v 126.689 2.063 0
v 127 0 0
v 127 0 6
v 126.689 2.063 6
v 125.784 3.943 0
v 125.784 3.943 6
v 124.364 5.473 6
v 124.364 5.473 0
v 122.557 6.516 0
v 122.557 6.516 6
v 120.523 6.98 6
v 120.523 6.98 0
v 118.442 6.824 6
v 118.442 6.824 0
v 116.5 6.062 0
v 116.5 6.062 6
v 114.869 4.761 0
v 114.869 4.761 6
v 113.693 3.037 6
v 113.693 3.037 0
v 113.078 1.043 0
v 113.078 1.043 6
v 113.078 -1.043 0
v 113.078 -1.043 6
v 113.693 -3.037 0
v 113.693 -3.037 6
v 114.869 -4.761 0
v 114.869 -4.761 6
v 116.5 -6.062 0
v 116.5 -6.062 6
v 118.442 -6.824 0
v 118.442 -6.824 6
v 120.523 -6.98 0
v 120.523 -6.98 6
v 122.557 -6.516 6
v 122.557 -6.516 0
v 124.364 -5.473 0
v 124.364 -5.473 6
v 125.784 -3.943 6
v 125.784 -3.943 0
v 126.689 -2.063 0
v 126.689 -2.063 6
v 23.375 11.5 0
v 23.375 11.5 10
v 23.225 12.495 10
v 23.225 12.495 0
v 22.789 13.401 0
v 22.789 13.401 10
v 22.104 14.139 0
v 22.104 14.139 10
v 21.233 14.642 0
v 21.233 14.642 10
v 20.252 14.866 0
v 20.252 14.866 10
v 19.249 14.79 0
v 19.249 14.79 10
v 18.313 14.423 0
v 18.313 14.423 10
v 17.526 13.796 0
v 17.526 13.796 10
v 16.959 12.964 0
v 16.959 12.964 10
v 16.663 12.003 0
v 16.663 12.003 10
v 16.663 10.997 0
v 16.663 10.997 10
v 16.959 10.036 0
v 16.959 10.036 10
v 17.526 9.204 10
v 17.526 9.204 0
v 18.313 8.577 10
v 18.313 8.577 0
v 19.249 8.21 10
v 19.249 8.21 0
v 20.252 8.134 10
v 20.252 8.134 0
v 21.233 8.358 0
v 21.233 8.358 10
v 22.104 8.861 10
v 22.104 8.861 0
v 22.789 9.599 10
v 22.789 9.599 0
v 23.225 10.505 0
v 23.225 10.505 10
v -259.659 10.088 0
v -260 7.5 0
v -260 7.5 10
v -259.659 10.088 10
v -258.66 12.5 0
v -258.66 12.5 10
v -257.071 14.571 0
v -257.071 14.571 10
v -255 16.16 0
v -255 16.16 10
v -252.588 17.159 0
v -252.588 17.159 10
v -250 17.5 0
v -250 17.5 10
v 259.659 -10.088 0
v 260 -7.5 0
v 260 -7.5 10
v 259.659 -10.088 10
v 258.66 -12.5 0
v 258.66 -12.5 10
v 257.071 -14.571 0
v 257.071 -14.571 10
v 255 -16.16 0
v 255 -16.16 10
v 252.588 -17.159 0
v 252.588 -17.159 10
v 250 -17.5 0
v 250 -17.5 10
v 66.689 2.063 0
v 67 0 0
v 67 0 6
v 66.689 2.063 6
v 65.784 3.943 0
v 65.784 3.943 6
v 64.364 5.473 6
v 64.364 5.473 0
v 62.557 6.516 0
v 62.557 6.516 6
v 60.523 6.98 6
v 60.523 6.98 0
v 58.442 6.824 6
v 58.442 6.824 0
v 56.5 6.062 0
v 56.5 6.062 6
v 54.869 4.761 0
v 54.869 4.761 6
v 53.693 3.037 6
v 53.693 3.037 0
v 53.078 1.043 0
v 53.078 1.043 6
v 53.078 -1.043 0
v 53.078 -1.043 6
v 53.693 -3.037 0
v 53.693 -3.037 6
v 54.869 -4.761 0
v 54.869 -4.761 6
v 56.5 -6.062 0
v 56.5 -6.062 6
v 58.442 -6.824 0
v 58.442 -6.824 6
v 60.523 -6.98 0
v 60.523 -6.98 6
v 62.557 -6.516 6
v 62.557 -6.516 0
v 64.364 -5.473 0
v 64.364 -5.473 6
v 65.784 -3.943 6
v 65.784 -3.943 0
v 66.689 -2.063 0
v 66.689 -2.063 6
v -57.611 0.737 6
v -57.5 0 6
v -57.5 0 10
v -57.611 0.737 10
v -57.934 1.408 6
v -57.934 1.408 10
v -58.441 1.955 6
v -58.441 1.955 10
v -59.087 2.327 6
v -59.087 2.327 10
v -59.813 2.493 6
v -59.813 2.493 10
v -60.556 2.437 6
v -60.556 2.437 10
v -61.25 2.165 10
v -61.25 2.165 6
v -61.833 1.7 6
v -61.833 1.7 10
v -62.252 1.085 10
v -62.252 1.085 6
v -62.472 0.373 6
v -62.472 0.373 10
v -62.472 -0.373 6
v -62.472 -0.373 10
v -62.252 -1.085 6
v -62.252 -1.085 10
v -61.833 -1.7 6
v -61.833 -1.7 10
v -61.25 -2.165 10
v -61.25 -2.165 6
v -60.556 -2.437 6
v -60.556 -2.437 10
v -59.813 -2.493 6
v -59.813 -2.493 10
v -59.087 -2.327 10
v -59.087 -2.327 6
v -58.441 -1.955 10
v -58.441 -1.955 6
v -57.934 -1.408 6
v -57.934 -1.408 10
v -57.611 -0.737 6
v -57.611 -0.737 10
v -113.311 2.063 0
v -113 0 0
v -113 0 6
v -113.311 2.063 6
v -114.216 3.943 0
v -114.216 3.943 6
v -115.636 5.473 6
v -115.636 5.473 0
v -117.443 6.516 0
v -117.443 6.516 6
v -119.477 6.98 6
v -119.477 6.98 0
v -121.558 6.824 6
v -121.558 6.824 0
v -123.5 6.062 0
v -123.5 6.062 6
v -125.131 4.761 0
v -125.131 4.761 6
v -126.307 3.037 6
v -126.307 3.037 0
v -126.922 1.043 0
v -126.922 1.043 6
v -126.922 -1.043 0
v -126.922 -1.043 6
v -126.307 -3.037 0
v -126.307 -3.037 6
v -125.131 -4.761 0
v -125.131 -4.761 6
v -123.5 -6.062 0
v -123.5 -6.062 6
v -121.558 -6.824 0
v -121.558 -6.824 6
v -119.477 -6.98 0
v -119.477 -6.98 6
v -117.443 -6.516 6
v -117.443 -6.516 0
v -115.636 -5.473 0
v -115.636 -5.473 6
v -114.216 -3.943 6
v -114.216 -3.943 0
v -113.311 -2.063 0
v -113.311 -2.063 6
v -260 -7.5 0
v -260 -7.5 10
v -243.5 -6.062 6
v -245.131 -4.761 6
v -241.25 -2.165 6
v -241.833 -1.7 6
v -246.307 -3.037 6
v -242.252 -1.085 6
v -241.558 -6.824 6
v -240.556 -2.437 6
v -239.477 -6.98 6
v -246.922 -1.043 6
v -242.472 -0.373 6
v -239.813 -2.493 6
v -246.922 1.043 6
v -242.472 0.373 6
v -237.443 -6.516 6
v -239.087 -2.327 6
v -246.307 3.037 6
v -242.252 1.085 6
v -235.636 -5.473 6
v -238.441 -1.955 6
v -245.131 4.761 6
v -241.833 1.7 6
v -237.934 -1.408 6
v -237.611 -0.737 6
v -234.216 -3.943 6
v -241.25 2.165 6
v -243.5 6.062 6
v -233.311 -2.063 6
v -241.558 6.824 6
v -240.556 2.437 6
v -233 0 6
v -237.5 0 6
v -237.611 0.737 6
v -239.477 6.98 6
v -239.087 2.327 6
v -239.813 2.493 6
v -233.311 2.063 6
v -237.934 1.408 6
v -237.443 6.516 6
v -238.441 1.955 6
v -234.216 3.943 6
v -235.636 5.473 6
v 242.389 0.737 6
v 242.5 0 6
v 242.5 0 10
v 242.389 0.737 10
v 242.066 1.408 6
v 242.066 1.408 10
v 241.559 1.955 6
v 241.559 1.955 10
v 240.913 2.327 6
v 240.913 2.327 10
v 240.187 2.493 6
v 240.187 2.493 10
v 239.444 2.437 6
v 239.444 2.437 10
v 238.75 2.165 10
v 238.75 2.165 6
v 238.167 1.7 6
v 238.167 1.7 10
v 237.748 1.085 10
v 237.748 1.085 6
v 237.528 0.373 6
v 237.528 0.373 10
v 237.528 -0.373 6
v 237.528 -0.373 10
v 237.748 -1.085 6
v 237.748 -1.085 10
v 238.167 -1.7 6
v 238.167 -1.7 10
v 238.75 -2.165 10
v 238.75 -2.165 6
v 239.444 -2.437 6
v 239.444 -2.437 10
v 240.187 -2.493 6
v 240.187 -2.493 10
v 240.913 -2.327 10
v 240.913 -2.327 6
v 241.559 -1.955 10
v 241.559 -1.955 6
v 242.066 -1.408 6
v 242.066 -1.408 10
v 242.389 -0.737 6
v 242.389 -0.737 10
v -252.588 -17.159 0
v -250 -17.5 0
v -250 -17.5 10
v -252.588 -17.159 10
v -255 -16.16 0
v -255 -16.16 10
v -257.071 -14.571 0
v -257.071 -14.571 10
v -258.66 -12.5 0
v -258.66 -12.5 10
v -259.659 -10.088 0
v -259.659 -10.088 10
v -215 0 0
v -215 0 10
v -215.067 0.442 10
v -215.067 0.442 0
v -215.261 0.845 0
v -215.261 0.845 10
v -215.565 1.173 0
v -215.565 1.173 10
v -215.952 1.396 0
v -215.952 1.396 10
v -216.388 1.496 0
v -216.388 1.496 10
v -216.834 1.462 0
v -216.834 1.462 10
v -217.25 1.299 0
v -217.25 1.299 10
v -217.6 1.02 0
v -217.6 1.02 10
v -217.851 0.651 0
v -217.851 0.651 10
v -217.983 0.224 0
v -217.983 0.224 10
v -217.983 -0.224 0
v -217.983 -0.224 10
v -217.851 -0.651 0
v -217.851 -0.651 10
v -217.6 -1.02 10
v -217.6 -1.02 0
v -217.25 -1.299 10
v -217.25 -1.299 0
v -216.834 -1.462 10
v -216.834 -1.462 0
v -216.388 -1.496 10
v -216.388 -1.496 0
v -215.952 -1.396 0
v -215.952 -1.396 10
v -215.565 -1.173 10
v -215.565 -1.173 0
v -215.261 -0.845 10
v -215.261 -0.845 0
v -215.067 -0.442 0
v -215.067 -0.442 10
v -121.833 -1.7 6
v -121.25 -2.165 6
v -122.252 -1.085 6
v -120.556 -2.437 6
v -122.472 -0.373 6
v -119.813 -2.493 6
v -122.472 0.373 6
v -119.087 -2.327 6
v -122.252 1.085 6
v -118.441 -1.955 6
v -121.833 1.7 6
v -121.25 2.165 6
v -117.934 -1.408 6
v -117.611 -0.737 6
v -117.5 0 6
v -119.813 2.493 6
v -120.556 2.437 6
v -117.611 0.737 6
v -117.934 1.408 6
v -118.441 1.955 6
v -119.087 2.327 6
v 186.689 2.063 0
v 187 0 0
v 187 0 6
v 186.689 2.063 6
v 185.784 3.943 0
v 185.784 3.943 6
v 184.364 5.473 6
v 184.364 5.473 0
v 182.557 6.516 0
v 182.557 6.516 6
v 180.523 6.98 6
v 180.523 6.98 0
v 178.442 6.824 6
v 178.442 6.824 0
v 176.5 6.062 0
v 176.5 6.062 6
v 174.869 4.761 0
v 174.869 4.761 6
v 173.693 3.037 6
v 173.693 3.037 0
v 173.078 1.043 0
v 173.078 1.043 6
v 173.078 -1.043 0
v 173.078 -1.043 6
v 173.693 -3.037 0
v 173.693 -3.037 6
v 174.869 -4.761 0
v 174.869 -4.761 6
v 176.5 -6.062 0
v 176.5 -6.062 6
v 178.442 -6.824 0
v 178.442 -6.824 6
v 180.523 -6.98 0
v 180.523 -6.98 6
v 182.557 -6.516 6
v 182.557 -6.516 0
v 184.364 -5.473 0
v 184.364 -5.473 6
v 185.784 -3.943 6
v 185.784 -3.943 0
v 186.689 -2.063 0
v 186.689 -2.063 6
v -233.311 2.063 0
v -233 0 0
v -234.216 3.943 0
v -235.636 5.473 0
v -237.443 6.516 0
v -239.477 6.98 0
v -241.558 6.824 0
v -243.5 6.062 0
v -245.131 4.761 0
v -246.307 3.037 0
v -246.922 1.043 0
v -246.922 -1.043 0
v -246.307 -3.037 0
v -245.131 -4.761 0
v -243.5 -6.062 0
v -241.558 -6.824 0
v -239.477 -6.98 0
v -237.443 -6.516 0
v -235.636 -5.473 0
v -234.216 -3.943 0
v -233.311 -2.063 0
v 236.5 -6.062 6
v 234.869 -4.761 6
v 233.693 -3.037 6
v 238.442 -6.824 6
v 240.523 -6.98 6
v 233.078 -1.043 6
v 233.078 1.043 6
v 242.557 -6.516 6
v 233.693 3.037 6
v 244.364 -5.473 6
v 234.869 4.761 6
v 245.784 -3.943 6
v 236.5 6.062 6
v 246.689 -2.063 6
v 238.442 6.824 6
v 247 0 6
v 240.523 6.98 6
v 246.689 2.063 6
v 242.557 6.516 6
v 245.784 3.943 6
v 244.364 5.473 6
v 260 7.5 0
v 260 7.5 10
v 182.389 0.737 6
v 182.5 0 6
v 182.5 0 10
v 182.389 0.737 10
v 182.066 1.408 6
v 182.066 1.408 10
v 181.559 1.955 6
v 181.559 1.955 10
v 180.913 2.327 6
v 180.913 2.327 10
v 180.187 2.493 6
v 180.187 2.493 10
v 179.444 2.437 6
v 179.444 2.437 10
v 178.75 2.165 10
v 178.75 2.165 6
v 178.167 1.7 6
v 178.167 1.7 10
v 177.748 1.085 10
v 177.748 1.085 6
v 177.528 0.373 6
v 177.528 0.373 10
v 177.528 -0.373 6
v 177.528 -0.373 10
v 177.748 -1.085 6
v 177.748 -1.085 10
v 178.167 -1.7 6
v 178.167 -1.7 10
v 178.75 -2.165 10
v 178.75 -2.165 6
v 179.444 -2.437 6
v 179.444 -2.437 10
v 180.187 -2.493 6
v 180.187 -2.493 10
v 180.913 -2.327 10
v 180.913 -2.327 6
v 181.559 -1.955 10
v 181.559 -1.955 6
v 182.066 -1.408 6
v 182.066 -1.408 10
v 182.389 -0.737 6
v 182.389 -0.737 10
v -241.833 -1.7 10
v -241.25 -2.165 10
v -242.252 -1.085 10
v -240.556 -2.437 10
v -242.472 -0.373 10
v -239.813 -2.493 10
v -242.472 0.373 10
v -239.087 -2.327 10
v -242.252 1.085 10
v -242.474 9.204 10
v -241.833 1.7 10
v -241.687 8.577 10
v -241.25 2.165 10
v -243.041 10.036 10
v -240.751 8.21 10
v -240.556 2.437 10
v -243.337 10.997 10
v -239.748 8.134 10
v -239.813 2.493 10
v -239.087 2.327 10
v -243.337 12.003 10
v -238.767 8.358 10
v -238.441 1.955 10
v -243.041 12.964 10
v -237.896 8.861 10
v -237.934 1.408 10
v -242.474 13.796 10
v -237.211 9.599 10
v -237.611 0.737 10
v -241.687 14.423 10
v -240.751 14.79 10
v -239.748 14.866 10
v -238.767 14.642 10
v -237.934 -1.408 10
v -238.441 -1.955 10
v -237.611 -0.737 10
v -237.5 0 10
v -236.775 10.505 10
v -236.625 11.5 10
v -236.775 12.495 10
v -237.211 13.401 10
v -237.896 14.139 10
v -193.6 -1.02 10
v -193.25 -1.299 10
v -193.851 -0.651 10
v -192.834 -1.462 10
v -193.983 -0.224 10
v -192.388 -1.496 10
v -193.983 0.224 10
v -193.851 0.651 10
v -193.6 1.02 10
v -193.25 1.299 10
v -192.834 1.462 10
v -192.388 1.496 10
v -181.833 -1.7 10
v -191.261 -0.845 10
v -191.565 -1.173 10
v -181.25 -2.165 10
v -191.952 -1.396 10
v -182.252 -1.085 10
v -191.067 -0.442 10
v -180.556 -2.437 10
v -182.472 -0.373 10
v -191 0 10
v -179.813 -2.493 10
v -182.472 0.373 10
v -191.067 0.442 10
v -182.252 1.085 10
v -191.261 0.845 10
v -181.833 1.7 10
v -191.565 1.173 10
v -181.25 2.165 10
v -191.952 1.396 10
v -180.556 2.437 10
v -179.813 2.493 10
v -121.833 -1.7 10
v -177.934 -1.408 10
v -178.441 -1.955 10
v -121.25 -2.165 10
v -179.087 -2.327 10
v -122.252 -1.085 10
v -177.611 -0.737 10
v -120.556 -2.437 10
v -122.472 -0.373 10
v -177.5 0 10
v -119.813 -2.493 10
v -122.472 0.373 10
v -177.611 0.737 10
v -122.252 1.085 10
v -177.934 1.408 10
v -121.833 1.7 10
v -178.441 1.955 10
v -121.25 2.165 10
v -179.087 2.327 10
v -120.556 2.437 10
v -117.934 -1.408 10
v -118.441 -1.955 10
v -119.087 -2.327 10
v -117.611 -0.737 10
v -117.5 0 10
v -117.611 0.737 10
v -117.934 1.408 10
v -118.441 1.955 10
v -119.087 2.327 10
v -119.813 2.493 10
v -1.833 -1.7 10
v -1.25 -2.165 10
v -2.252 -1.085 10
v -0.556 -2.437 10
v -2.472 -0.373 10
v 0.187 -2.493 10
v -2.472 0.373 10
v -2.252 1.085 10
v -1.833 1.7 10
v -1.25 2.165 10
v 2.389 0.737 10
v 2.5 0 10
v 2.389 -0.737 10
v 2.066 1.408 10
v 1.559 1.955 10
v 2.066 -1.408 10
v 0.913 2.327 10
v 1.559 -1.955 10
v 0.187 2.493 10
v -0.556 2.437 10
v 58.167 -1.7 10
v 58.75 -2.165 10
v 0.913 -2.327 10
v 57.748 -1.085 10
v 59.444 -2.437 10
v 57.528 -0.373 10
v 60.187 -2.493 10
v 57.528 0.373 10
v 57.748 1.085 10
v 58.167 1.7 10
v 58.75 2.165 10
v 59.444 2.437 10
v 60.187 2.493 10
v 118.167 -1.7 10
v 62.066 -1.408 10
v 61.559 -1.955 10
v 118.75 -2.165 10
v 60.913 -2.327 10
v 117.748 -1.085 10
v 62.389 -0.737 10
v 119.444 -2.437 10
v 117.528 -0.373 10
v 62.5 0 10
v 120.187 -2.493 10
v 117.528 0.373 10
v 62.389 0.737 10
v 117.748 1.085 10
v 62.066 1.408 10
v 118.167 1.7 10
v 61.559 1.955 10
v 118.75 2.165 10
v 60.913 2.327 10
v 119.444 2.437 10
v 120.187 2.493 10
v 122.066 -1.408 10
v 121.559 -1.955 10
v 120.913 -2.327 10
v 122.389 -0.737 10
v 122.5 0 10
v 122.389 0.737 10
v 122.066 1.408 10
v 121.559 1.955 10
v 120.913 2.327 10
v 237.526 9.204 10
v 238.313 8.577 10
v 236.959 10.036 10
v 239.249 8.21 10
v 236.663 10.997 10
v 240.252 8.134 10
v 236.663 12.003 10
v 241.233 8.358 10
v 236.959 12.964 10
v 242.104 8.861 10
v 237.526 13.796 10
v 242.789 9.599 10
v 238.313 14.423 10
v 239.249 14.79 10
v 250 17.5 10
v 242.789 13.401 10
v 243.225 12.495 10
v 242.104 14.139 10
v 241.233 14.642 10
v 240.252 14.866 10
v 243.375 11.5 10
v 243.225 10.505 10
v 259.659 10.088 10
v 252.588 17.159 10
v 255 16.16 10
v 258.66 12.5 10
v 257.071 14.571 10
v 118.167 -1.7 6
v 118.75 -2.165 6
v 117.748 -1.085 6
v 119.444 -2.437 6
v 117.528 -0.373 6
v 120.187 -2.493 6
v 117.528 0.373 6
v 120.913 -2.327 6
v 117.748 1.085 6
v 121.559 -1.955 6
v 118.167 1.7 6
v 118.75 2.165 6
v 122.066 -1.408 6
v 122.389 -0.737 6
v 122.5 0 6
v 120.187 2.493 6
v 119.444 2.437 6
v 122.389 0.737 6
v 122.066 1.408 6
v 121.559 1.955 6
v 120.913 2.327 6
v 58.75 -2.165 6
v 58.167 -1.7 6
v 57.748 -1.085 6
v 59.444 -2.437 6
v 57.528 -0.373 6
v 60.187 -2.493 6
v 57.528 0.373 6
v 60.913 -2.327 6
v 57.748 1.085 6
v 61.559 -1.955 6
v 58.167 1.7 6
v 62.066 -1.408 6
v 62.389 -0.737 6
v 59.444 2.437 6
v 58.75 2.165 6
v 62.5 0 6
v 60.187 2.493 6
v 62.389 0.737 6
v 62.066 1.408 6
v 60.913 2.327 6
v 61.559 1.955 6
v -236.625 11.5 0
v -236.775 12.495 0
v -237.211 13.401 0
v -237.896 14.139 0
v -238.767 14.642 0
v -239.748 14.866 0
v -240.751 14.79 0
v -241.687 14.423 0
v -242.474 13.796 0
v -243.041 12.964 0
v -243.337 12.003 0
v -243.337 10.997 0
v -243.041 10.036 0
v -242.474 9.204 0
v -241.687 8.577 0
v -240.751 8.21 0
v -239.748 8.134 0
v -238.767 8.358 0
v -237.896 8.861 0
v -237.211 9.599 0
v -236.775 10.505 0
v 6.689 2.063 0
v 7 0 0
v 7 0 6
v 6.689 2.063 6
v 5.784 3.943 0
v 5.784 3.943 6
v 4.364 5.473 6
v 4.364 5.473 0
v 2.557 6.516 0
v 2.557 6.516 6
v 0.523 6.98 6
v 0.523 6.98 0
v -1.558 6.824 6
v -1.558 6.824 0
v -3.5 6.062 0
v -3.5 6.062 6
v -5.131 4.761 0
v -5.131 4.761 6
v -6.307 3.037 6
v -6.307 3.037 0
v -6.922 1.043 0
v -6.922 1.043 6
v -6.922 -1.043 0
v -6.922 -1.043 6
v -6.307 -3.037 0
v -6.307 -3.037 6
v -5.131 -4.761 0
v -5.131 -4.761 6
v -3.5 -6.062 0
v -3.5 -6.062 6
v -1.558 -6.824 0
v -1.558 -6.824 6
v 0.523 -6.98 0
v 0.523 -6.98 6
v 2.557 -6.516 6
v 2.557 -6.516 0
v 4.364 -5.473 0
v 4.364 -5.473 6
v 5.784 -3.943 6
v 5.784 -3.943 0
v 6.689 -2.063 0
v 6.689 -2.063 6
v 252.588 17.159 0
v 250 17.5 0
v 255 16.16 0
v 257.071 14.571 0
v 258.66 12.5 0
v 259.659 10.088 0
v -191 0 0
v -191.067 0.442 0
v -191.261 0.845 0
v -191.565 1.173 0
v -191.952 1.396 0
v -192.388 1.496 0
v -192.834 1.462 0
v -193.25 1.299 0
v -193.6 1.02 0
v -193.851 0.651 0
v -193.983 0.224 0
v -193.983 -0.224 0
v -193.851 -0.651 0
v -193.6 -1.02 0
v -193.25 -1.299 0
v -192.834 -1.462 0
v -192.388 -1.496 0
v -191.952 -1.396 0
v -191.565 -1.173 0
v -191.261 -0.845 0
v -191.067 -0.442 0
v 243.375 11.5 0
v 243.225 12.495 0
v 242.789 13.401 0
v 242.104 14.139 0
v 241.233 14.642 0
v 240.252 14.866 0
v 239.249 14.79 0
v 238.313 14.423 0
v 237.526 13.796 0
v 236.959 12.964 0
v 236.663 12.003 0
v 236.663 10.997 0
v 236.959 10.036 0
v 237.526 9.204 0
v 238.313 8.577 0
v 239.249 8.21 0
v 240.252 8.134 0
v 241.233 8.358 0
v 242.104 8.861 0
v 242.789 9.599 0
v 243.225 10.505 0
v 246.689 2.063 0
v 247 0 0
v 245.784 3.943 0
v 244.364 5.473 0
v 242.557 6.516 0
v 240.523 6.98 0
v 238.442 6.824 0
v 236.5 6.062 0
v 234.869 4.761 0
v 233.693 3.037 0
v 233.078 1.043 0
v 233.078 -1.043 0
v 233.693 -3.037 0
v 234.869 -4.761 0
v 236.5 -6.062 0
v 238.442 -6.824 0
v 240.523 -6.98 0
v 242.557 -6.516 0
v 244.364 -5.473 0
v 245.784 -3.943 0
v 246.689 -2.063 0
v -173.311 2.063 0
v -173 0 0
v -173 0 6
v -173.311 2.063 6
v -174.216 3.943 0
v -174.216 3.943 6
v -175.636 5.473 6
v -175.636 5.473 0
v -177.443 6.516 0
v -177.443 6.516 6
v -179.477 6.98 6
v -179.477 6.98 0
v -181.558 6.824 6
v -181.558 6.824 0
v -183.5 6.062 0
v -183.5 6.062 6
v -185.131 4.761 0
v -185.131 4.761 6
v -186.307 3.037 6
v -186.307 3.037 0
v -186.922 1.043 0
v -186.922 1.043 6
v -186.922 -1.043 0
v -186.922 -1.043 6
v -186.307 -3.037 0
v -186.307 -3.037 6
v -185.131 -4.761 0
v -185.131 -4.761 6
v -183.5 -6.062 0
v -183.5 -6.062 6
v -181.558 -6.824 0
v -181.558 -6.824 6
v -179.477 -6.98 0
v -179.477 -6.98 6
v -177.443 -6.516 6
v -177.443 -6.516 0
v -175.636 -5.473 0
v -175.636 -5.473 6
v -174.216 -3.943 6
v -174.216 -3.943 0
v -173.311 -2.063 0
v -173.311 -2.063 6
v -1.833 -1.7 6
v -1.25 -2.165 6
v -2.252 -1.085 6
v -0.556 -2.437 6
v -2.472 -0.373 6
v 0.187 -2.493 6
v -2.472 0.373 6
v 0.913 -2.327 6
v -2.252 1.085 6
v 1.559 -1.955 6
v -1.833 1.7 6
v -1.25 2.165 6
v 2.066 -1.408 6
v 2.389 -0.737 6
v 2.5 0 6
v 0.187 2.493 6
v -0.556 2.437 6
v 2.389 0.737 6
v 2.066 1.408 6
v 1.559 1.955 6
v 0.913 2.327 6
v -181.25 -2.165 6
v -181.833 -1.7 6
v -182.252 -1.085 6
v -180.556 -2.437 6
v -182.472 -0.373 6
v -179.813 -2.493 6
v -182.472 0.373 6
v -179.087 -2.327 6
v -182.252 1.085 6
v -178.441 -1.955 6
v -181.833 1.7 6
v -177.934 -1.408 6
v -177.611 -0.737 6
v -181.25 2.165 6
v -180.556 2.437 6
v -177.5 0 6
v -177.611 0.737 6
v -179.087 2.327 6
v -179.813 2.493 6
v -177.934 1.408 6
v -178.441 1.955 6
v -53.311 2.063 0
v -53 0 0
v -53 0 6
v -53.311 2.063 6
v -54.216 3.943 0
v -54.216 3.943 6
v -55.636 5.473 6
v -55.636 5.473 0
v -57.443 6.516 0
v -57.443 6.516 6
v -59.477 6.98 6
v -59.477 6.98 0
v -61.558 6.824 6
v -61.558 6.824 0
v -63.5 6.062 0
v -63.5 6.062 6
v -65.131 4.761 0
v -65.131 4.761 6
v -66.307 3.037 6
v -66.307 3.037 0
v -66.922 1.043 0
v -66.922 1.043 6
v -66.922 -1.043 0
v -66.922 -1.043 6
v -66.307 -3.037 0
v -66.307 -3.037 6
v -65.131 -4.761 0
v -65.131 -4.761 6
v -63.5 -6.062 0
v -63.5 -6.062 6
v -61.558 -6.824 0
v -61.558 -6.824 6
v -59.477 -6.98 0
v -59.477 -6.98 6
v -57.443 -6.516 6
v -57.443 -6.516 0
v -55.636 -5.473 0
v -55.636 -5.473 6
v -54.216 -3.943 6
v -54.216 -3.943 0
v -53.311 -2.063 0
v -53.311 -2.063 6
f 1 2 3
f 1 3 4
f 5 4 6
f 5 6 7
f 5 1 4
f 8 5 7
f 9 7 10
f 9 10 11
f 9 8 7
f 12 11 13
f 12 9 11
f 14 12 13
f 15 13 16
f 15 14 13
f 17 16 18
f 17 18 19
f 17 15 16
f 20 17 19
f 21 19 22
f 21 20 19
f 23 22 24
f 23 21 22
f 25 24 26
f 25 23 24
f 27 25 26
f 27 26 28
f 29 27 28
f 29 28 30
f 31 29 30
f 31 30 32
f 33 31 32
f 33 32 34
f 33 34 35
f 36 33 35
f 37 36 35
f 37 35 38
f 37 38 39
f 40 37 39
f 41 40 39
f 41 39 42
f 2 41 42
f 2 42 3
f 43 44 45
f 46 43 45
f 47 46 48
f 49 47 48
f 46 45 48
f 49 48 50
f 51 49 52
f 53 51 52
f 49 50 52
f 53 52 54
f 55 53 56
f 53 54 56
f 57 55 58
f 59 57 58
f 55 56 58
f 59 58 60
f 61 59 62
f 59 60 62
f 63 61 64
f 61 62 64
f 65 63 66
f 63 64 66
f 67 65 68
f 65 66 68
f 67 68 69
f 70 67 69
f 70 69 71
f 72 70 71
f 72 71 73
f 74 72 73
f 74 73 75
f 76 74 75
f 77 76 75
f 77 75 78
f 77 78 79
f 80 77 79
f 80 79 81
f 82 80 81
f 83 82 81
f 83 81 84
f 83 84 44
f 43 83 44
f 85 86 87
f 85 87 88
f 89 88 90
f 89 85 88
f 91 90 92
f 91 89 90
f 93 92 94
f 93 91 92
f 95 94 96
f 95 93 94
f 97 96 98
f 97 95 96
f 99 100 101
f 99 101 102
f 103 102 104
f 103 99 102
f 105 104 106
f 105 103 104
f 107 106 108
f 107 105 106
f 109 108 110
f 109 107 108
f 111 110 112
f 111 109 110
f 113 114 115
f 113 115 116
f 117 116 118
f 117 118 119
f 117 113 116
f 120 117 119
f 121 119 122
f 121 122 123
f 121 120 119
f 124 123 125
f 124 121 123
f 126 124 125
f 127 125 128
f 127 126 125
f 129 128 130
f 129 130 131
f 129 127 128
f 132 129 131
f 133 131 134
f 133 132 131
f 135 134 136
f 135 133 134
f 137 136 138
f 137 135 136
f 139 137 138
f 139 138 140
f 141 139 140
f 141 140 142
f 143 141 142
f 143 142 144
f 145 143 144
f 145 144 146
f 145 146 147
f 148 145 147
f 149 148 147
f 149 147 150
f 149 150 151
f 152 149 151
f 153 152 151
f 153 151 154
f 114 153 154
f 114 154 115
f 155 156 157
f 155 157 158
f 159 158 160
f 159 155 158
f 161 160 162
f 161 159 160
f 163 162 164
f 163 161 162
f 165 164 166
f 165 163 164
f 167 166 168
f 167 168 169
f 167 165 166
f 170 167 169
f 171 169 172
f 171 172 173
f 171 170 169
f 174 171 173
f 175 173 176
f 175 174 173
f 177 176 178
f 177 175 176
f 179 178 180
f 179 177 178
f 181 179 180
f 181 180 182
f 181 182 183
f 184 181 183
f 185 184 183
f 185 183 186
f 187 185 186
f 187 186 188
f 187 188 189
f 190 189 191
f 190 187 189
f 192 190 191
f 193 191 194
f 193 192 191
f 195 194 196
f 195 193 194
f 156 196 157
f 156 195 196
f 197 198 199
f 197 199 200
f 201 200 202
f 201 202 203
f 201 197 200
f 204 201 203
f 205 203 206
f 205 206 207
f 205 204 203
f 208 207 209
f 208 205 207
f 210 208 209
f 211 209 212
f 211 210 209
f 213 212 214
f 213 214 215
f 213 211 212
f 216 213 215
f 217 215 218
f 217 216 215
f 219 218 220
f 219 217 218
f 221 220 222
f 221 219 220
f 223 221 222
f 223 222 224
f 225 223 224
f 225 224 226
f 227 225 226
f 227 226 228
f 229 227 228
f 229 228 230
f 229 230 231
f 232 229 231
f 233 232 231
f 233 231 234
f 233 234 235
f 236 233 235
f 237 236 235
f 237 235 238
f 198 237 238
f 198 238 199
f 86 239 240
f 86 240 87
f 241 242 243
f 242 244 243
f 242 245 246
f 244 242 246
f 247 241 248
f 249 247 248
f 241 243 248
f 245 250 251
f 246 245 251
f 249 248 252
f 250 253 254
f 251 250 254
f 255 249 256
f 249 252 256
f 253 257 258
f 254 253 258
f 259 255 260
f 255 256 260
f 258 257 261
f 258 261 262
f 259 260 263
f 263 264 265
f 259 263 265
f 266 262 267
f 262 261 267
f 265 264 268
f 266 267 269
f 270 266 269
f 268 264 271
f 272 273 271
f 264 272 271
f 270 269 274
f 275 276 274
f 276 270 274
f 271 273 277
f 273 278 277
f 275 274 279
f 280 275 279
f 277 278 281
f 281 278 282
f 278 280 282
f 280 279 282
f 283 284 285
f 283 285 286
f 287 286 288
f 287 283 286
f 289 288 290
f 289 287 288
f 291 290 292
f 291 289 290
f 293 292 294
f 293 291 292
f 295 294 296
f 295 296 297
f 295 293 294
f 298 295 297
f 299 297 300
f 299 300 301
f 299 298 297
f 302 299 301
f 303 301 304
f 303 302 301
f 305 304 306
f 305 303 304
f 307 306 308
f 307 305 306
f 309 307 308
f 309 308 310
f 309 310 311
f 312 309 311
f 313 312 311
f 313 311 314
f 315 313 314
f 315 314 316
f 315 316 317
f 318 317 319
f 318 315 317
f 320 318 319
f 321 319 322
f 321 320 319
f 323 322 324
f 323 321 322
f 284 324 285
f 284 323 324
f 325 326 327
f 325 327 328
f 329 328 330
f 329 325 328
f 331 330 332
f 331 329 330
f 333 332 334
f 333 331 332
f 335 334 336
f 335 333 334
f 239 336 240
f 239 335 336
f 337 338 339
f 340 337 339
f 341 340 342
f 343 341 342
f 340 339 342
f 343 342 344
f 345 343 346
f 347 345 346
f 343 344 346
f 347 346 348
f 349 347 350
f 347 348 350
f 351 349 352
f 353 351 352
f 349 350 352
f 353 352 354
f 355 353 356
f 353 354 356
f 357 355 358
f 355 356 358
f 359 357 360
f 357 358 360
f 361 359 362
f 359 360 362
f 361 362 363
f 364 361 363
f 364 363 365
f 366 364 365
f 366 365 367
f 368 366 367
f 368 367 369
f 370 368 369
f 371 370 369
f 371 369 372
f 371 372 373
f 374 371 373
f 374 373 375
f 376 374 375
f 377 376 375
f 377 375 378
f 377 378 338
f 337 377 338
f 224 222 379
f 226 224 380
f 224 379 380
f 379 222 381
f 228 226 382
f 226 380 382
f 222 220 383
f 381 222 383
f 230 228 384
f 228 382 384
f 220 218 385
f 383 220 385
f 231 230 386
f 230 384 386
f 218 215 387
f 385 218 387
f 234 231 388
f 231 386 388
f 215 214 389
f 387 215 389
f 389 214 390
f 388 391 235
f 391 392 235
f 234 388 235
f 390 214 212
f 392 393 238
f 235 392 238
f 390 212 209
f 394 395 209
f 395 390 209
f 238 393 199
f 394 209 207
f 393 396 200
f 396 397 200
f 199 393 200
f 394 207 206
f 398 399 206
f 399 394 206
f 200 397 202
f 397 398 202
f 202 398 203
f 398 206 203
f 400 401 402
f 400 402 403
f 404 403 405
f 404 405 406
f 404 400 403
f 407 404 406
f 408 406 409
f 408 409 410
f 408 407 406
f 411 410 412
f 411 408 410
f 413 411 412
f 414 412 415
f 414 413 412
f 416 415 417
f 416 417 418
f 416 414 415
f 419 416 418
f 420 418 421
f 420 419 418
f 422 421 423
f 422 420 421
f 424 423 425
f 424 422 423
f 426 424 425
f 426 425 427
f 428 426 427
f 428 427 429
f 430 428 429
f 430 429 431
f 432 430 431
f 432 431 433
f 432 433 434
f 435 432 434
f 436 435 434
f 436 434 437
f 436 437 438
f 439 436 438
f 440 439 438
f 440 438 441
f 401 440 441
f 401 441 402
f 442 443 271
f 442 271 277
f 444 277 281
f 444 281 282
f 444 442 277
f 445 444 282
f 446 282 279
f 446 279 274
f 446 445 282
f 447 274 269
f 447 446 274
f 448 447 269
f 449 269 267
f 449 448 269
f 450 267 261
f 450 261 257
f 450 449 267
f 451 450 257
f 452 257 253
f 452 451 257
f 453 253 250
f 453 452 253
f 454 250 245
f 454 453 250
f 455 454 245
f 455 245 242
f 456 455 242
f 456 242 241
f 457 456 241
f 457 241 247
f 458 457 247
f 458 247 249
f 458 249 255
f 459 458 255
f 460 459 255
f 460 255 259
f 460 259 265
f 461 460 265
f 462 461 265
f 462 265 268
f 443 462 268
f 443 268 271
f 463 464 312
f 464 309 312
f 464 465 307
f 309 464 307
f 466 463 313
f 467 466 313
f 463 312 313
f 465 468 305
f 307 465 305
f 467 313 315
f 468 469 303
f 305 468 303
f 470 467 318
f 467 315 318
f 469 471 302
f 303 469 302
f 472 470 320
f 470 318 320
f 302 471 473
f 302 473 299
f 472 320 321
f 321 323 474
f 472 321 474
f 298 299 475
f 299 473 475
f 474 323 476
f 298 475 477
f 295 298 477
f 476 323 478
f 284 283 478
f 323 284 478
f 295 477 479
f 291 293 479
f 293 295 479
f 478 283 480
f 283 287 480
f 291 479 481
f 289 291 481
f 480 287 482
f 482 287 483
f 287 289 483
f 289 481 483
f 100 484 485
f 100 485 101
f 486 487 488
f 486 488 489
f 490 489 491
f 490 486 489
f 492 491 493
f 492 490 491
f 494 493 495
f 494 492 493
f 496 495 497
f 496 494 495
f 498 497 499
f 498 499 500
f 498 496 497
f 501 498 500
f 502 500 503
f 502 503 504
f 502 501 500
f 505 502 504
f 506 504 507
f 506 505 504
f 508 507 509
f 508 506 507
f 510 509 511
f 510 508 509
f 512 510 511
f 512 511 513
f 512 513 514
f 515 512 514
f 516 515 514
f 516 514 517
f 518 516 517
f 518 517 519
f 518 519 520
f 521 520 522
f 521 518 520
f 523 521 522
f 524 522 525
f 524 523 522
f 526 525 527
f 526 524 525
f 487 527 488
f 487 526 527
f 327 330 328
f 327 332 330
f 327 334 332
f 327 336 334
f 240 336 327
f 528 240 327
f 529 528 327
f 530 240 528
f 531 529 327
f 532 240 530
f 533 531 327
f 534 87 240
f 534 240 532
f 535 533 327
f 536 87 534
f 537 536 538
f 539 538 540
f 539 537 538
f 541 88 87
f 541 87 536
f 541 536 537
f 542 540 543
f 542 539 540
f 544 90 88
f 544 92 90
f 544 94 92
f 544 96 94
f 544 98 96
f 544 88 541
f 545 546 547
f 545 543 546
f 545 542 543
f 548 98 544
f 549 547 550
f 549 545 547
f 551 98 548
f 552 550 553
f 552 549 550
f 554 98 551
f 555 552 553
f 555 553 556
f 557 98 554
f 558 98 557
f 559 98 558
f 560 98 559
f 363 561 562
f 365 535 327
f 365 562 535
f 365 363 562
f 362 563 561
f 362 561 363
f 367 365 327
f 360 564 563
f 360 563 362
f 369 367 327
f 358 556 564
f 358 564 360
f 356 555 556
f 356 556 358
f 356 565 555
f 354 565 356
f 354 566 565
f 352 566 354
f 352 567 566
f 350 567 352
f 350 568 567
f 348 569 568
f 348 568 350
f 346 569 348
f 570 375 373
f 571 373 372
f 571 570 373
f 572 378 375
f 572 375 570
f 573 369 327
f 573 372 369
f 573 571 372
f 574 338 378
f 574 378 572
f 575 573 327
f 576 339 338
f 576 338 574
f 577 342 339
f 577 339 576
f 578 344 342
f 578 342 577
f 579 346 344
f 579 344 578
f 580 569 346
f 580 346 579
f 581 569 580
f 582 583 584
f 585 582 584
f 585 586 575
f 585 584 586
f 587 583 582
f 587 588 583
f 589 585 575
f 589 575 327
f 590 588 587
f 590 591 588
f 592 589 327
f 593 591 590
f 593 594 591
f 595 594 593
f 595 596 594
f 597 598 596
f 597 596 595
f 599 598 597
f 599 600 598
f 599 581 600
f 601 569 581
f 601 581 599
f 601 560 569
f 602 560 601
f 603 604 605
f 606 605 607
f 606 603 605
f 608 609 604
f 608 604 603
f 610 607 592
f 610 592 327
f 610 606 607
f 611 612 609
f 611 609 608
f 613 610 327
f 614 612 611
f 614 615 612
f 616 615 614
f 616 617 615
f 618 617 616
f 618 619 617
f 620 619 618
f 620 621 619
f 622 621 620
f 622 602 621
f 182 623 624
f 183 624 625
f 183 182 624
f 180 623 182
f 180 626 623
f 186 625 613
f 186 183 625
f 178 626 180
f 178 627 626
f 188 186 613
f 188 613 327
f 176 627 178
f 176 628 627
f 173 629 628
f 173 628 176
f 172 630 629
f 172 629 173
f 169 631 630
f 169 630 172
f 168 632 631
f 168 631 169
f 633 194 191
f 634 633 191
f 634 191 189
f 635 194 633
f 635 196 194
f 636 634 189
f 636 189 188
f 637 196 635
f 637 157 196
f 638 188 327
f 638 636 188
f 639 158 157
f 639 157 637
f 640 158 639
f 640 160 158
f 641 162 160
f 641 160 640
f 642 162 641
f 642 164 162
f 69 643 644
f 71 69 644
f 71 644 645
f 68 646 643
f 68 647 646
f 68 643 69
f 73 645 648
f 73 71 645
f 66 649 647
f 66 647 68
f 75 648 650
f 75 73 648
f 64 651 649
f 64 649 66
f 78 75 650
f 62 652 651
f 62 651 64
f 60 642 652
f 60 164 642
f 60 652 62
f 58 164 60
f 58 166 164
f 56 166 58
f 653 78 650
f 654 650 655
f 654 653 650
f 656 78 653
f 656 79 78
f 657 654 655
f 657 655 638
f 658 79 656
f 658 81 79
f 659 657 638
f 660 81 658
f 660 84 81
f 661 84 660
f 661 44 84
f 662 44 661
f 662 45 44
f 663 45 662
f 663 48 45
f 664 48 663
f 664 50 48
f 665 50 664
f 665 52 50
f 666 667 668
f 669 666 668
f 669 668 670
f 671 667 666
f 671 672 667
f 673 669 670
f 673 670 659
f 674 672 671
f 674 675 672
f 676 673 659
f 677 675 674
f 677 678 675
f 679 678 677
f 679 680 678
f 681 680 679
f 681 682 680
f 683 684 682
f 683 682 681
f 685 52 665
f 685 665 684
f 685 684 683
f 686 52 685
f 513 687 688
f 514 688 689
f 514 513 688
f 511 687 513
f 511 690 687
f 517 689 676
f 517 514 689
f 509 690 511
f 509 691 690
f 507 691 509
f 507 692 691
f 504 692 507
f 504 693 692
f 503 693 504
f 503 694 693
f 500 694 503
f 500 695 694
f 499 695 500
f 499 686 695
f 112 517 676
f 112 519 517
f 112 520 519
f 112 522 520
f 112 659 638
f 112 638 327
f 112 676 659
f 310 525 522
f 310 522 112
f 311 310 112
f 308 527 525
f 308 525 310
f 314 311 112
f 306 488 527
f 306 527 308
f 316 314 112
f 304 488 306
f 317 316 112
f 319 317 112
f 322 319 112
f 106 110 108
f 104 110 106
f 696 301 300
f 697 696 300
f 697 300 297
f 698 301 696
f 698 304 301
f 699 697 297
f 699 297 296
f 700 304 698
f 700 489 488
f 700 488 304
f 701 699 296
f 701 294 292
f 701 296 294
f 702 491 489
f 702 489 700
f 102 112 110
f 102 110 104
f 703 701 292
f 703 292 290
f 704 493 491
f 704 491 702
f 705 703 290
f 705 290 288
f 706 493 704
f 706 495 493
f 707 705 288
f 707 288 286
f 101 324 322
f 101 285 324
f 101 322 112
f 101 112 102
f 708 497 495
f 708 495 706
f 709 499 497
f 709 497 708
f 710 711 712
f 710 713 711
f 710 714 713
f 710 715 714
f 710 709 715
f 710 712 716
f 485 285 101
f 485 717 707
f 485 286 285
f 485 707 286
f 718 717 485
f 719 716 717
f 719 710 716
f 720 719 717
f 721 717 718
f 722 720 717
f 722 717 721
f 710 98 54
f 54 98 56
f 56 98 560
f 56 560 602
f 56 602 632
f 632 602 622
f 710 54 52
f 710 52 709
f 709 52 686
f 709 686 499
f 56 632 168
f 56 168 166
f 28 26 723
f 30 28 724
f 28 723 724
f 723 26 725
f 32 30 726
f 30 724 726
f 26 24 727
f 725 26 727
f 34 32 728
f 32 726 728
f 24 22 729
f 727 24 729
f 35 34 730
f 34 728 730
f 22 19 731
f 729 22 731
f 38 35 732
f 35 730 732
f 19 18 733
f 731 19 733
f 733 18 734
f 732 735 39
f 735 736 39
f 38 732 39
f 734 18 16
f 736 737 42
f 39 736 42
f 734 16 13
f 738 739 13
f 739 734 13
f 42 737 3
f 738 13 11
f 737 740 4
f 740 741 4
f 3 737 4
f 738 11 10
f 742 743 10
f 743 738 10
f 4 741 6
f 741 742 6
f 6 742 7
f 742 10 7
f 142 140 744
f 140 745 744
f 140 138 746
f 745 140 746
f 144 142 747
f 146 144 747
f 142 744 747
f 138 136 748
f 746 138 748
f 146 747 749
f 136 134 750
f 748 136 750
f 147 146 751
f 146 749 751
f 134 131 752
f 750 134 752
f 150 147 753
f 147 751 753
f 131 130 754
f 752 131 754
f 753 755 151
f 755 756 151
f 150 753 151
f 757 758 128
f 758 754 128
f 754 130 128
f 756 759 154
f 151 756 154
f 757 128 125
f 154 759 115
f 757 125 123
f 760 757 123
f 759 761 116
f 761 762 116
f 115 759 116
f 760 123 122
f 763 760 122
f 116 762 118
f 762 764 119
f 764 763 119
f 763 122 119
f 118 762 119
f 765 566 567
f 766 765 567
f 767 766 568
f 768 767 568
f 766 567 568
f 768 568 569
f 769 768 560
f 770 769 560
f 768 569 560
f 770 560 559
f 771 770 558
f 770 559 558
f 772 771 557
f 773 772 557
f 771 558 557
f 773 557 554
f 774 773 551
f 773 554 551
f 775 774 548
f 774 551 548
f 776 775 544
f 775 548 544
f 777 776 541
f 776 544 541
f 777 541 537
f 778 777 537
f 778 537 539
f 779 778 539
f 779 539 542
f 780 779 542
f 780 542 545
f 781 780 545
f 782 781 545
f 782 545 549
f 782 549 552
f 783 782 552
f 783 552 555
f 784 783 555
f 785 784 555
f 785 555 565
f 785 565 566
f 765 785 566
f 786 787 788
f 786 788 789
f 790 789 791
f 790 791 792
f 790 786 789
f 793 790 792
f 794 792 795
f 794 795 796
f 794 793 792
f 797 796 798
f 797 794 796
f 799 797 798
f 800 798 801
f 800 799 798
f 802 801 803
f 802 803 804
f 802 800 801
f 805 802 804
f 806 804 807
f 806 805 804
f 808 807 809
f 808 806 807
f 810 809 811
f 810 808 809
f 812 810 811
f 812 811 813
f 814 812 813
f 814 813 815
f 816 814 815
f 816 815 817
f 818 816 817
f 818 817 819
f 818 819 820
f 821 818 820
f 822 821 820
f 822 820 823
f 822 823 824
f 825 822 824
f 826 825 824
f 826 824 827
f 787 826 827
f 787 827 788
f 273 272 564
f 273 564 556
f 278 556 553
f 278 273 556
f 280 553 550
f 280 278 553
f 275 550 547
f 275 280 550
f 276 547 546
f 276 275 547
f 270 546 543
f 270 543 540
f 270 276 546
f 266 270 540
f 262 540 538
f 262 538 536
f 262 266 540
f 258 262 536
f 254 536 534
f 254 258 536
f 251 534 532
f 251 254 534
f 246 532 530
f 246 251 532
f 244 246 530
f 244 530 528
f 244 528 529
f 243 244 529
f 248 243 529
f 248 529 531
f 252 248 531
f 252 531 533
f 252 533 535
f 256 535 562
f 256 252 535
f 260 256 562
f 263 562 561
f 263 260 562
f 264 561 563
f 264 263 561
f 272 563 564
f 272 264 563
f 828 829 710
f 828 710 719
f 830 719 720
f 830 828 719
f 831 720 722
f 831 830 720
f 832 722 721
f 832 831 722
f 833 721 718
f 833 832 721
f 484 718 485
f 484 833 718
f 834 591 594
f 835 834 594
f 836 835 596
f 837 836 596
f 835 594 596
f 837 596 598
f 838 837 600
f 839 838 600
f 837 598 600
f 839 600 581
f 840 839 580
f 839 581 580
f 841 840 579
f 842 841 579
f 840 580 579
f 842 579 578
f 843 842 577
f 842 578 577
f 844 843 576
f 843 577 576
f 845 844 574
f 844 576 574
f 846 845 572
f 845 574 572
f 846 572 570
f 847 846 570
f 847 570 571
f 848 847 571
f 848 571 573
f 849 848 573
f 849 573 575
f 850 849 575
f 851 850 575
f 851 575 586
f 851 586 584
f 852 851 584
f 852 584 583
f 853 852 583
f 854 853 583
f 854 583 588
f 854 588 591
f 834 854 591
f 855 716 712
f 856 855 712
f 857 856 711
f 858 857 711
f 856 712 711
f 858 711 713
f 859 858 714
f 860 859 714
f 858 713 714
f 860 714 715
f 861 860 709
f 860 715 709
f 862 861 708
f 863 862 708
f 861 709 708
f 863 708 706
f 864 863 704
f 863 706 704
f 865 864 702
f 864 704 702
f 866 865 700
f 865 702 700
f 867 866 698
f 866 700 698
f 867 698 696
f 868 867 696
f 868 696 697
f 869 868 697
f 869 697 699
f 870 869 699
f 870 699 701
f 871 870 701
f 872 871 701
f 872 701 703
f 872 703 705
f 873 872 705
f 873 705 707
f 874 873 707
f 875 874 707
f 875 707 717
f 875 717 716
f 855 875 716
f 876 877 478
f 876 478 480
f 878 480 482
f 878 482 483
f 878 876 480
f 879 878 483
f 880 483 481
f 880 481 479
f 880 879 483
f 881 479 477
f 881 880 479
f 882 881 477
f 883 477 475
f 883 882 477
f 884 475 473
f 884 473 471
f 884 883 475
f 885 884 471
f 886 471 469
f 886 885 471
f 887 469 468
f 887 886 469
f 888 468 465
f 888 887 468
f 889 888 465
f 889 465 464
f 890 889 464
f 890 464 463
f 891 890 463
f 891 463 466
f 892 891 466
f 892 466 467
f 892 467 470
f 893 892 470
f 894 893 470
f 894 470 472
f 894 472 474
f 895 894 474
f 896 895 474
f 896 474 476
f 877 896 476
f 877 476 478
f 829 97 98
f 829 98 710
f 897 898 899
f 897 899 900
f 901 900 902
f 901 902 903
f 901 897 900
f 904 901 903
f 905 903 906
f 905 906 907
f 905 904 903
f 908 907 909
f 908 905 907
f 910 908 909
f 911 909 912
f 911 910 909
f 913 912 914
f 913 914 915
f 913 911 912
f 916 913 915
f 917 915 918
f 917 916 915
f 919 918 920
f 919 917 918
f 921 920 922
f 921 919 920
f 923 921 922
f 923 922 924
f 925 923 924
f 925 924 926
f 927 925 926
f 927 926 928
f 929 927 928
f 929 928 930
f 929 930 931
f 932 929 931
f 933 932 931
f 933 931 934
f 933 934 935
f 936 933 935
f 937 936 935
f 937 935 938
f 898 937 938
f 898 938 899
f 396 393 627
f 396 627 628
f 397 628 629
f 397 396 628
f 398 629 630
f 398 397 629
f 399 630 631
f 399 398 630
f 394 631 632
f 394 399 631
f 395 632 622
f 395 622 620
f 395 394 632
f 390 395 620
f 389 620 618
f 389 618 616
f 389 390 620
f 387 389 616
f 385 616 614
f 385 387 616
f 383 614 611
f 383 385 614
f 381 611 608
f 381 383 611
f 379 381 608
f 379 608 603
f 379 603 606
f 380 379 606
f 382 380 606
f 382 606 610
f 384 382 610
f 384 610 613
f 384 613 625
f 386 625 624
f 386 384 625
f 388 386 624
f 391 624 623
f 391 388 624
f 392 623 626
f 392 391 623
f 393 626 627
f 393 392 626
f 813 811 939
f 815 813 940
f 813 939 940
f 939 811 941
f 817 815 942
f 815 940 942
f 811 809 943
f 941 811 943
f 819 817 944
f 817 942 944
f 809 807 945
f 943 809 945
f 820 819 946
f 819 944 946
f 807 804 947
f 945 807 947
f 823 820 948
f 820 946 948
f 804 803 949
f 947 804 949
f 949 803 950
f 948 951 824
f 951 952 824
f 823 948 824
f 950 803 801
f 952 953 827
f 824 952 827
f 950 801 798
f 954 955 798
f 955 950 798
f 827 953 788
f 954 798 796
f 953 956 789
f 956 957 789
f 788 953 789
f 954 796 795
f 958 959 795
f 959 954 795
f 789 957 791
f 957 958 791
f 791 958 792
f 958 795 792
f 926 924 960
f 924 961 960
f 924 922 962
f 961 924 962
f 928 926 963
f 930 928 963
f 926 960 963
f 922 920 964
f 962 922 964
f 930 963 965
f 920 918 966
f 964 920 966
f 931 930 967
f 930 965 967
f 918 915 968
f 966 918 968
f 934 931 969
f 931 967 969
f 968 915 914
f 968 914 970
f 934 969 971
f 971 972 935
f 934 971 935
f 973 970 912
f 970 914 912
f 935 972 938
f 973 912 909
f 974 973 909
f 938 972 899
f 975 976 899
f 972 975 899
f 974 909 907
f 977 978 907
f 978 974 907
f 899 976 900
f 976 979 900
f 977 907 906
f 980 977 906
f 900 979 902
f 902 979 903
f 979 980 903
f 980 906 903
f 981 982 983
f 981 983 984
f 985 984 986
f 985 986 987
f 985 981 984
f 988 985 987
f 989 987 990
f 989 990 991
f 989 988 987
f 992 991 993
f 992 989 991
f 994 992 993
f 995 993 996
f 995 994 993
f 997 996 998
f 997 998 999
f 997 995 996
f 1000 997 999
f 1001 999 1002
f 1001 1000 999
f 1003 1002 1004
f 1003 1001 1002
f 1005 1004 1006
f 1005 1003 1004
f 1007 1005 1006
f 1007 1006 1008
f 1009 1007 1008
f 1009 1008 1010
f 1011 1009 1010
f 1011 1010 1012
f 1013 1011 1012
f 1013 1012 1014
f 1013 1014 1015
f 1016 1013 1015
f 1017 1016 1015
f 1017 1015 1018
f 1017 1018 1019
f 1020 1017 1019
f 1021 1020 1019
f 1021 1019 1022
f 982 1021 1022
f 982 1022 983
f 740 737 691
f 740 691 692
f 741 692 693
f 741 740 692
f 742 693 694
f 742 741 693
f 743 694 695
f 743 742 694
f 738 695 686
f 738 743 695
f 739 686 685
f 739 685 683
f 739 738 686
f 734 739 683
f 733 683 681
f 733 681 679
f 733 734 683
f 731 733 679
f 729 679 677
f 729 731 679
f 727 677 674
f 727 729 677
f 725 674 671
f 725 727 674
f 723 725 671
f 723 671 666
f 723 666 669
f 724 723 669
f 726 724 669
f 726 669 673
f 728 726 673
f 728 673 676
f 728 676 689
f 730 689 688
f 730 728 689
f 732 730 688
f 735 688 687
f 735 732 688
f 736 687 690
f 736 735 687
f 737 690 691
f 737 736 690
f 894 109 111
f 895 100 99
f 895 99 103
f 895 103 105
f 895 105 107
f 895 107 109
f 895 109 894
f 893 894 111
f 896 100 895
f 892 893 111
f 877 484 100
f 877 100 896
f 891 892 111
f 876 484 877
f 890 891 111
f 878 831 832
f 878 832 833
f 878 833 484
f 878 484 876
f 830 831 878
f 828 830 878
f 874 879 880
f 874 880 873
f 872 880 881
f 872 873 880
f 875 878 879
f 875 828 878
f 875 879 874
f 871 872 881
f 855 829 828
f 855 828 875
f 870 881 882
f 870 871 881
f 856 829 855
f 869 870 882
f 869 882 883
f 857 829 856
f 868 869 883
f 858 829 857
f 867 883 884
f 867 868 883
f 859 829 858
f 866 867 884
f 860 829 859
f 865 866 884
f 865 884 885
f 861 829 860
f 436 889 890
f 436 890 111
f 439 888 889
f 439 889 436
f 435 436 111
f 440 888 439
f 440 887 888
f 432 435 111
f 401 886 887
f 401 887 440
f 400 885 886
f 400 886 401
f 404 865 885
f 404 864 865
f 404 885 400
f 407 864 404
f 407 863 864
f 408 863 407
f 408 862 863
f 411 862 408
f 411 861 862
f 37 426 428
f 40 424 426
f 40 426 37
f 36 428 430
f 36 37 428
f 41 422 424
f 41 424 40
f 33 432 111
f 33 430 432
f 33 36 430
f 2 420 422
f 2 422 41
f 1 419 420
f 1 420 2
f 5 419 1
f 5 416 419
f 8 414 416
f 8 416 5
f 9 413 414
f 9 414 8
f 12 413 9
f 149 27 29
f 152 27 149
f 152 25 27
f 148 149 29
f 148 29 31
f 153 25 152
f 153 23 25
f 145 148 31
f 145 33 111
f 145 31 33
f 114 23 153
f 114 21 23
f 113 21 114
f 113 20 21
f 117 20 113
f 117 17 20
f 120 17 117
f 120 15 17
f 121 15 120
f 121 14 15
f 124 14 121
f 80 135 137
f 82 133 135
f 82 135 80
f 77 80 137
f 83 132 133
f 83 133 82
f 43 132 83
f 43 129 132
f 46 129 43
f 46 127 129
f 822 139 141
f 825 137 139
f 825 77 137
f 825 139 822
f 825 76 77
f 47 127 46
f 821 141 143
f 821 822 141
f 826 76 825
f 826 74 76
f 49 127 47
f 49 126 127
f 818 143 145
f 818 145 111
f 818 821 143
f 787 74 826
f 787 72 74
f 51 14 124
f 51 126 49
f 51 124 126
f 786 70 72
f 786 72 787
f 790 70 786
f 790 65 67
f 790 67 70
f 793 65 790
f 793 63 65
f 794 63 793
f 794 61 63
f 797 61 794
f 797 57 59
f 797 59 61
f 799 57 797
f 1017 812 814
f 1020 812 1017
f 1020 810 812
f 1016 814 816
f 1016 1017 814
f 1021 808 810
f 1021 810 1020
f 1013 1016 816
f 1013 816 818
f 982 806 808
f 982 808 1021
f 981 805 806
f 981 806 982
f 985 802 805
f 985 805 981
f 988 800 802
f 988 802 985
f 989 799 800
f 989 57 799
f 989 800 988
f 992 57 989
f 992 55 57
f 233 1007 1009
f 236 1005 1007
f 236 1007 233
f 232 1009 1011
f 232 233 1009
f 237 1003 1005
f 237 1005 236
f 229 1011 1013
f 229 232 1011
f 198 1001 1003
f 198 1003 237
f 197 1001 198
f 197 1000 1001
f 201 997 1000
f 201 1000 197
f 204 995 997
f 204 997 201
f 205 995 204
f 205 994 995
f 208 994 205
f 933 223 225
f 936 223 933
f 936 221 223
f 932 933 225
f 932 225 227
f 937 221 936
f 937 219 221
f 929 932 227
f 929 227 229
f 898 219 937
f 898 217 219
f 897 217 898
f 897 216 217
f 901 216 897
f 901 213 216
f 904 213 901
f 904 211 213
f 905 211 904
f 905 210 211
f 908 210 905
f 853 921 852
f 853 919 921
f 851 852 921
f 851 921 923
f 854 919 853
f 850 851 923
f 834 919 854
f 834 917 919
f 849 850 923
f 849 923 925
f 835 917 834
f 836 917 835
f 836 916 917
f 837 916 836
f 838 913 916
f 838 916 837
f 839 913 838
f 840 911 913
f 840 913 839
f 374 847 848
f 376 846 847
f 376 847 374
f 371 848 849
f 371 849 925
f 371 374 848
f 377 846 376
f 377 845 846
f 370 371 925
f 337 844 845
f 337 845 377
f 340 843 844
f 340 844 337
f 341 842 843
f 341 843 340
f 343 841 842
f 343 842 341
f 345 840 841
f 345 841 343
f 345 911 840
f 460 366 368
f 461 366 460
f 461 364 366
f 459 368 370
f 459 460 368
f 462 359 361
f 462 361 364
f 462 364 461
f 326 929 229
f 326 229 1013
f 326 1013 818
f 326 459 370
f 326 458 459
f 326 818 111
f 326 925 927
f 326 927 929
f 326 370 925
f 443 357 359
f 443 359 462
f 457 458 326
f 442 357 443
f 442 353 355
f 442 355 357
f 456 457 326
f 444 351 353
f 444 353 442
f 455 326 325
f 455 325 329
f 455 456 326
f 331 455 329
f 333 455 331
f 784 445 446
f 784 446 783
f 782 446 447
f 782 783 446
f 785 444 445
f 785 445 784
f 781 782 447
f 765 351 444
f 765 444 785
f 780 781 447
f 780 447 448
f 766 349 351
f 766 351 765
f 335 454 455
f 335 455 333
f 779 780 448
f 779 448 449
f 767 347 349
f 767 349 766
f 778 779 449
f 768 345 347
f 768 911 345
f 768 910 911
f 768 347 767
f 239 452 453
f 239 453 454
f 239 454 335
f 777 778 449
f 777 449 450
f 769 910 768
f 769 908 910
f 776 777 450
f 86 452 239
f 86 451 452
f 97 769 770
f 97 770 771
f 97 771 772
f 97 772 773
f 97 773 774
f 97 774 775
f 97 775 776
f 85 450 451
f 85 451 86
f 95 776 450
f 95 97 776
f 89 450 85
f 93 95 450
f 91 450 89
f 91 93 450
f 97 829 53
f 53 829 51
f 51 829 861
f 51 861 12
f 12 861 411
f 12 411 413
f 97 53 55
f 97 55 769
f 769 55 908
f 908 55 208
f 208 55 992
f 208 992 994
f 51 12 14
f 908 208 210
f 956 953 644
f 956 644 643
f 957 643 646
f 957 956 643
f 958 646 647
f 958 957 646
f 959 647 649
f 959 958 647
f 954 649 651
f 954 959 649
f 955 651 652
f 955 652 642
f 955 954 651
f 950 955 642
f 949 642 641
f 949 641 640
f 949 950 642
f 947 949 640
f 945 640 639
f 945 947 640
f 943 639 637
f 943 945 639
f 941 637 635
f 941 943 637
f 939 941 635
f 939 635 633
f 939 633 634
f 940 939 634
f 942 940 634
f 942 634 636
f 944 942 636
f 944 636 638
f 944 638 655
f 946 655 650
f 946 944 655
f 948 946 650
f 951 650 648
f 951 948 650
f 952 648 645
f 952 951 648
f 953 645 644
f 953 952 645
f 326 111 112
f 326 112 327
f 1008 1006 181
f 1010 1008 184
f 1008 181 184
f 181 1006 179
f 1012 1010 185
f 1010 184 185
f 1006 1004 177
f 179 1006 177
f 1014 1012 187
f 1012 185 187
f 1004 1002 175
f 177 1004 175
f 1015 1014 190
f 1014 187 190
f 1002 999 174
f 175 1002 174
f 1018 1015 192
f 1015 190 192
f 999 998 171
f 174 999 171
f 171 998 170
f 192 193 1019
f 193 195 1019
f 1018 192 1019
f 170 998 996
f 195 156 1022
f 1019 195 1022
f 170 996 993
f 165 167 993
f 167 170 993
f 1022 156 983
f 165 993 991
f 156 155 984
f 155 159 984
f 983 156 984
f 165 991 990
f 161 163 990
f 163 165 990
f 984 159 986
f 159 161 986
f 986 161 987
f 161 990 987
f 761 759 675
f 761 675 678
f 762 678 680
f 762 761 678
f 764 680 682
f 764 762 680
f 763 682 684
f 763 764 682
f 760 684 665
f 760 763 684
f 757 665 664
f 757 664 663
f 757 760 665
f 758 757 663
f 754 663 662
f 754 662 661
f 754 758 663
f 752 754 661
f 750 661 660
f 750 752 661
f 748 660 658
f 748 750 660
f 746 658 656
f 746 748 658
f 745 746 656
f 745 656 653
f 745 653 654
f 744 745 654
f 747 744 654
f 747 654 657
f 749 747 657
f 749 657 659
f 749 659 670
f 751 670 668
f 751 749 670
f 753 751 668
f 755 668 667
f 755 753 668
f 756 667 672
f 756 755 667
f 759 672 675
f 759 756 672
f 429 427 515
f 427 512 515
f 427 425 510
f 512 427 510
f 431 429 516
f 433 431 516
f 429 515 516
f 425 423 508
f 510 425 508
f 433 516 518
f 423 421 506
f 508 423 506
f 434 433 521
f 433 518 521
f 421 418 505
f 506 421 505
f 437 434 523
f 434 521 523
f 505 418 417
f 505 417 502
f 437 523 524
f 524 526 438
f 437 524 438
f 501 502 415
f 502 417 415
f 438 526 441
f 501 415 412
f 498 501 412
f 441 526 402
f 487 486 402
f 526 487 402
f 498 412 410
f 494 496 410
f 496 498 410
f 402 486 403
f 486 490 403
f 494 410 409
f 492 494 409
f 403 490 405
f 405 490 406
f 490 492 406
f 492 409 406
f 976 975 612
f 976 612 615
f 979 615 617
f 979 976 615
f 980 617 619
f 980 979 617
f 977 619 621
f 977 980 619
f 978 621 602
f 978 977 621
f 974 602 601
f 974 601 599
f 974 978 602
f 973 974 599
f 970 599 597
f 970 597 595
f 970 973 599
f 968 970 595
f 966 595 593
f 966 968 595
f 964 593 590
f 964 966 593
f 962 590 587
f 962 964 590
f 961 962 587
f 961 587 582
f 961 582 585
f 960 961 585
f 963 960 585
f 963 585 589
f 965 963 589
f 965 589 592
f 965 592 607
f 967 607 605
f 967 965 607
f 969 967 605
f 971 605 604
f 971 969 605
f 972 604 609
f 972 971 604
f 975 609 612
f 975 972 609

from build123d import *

# Parameters (mm, degrees)
ESQUISSE1_R             = 7
BOSS_EXTRU_1_DEPTH      = 10
BOSS_EXTRU_2_START      = -4
ESQUISSE2_R             = 7
ESQUISSE2_R_2           = 2.5
BOSS_EXTRU_2_DEPTH      = 4
ESQUISSE3_R             = 3.375
ENL_V_MAT_EXTRU_1_DEPTH = 261.780079761
ESQUISSE4_R             = 3.375
ENL_V_MAT_EXTRU_2_DEPTH = 261.780079761
ESQUISSE5_R             = 1.5
ENL_V_MAT_EXTRU_3_DEPTH = 261.780079761


with BuildPart() as part:
    # Esquisse1 → Boss.-Extru.1 (new body)
    with BuildSketch(Plane.XY):
        with BuildLine():
            Line((-250, 17.5), (250, 17.5))
            ThreePointArc((250, 17.5), (257.071067812, 14.571067812), (260, 7.5))
            Line((260, 7.5), (260, -7.5))
            ThreePointArc((260, -7.5), (257.071067812, -14.571067812), (250, -17.5))
            Line((250, -17.5), (-250, -17.5))
            ThreePointArc((-250, -17.5), (-257.071067812, -14.571067812), (-260, -7.5))
            Line((-260, -7.5), (-260, 7.5))
            ThreePointArc((-260, 7.5), (-257.071067812, 14.571067812), (-250, 17.5))
        make_face()
        with Locations((-240, 0)):
            Circle(ESQUISSE1_R, mode=Mode.SUBTRACT)
        with Locations((-180, 0)):
            Circle(ESQUISSE1_R, mode=Mode.SUBTRACT)
        with Locations((-120, 0)):
            Circle(ESQUISSE1_R, mode=Mode.SUBTRACT)
        with Locations((-60, 0)):
            Circle(ESQUISSE1_R, mode=Mode.SUBTRACT)
        Circle(ESQUISSE1_R, mode=Mode.SUBTRACT)
        with Locations((60, 0)):
            Circle(ESQUISSE1_R, mode=Mode.SUBTRACT)
        with Locations((120, 0)):
            Circle(ESQUISSE1_R, mode=Mode.SUBTRACT)
        with Locations((180, 0)):
            Circle(ESQUISSE1_R, mode=Mode.SUBTRACT)
        with Locations((240, 0)):
            Circle(ESQUISSE1_R, mode=Mode.SUBTRACT)
    extrude(amount=BOSS_EXTRU_1_DEPTH)

    # Esquisse2 → Boss.-Extru.2 (add)
    # profile 1 of 9: a face of its own
    with BuildSketch(Plane.XY.offset(10).offset(BOSS_EXTRU_2_START)):
        with Locations((-240, 0)):
            Circle(ESQUISSE2_R)
        with Locations((-240, 0)):
            Circle(ESQUISSE2_R_2, mode=Mode.SUBTRACT)
    # profile 2 of 9: a face of its own
    with BuildSketch(Plane.XY.offset(10).offset(BOSS_EXTRU_2_START)):
        with Locations((-180, 0)):
            Circle(ESQUISSE2_R)
        with Locations((-180, 0)):
            Circle(ESQUISSE2_R_2, mode=Mode.SUBTRACT)
    # profile 3 of 9: a face of its own
    with BuildSketch(Plane.XY.offset(10).offset(BOSS_EXTRU_2_START)):
        with Locations((-120, 0)):
            Circle(ESQUISSE2_R)
        with Locations((-120, 0)):
            Circle(ESQUISSE2_R_2, mode=Mode.SUBTRACT)
    # profile 4 of 9: a face of its own
    with BuildSketch(Plane.XY.offset(10).offset(BOSS_EXTRU_2_START)):
        with Locations((-60, 0)):
            Circle(ESQUISSE2_R)
        with Locations((-60, 0)):
            Circle(ESQUISSE2_R_2, mode=Mode.SUBTRACT)
    # profile 5 of 9: a face of its own
    with BuildSketch(Plane.XY.offset(10).offset(BOSS_EXTRU_2_START)):
        Circle(ESQUISSE2_R)
        Circle(ESQUISSE2_R_2, mode=Mode.SUBTRACT)
    # profile 6 of 9: a face of its own
    with BuildSketch(Plane.XY.offset(10).offset(BOSS_EXTRU_2_START)):
        with Locations((60, 0)):
            Circle(ESQUISSE2_R)
        with Locations((60, 0)):
            Circle(ESQUISSE2_R_2, mode=Mode.SUBTRACT)
    # profile 7 of 9: a face of its own
    with BuildSketch(Plane.XY.offset(10).offset(BOSS_EXTRU_2_START)):
        with Locations((120, 0)):
            Circle(ESQUISSE2_R)
        with Locations((120, 0)):
            Circle(ESQUISSE2_R_2, mode=Mode.SUBTRACT)
    # profile 8 of 9: a face of its own
    with BuildSketch(Plane.XY.offset(10).offset(BOSS_EXTRU_2_START)):
        with Locations((180, 0)):
            Circle(ESQUISSE2_R)
        with Locations((180, 0)):
            Circle(ESQUISSE2_R_2, mode=Mode.SUBTRACT)
    # profile 9 of 9: a face of its own
    with BuildSketch(Plane.XY.offset(10).offset(BOSS_EXTRU_2_START)):
        with Locations((240, 0)):
            Circle(ESQUISSE2_R)
        with Locations((240, 0)):
            Circle(ESQUISSE2_R_2, mode=Mode.SUBTRACT)
    extrude(amount=BOSS_EXTRU_2_DEPTH)

    # Esquisse3 → Enlèv. mat.-Extru.1 (cut, through all)
    with BuildSketch(Plane.XY.offset(10)):
        with Locations((20.000000156, 11.500000313)):
            Circle(ESQUISSE3_R)
        with Locations((-239.999999844, 11.500000313)):
            Circle(ESQUISSE3_R)
    extrude(amount=-ENL_V_MAT_EXTRU_1_DEPTH, mode=Mode.SUBTRACT)

    # Esquisse4 → Enlèv. mat.-Extru.2 (cut, through all)
    with BuildSketch(Plane.XY.offset(10)):
        with Locations((240.000000156, 11.500000313)):
            Circle(ESQUISSE4_R)
    extrude(amount=-ENL_V_MAT_EXTRU_2_DEPTH, mode=Mode.SUBTRACT)

    # Esquisse5 → Enlèv. mat.-Extru.3 (cut, through all)
    with BuildSketch(Plane.XY.offset(10)):
        with Locations((-192.499999844, 0)):
            Circle(ESQUISSE5_R)
        with Locations((-216.499999844, 0)):
            Circle(ESQUISSE5_R)
    extrude(amount=-ENL_V_MAT_EXTRU_3_DEPTH, mode=Mode.SUBTRACT)


solid = part.part
